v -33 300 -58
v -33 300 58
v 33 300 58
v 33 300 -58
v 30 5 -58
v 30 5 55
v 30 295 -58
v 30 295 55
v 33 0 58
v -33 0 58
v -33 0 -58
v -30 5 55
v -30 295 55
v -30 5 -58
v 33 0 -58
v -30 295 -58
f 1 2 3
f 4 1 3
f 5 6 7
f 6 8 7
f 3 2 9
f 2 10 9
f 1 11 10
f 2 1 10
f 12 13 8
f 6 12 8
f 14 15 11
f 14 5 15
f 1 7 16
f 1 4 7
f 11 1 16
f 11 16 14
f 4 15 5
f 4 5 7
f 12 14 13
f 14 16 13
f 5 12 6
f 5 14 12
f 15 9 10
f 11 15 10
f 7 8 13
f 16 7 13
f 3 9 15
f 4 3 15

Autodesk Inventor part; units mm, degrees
ref_plane "YZ Plane" through (0, 0, 0) normal (1, 0, 0) x (0, 1, 0)
ref_plane "XZ Plane" through (0, 0, 0) normal (0, 1, 0) x (-1, 0, 0)
ref_plane "XY Plane" through (0, 0, 0) normal (0, 0, 1) x (1, 0, 0)
sketch "Boceto1" plane through (0, 0, 0) normal (0, 1, 0) x (-1, 0, 0)
  line L0 (30, 55) -> (-30, 55)
  line L1 (-30, 55) -> (-30, -55)
  line L2 (-30, -55) -> (30, -55)
  line L3 (30, -55) -> (30, 55)
  line L4 (33, 58) -> (-33, 58)
  line L5 (-33, 58) -> (-33, -58)
  line L6 (-33, -58) -> (33, -58)
  line L7 (33, -58) -> (33, 58)
  point P0 (0, 0)
  point P1 (0, -55)
  point P2 (30, 0)
  dimension "d0" = 110
  dimension "d1" = 60
  dimension "d2" = 3
  dimension "d3" = 3
  dimension "d4" = 3
  dimension "d5" = 3
extrude "Extrusión1" add sketch "Boceto1" along normal blind 300
sketch "Boceto2" plane through (0, 300, 0) normal (0, 1, 0) x (1, 0, 0)
  line L0 (33, -58) -> (33, 58) construction
  line L1 (33, 58) -> (-33, 58) construction
  line L2 (-33, 58) -> (-33, -58) construction
  line L3 (-33, -58) -> (33, -58) construction
  line L4 (-30, -55) -> (-30, 55) construction
  line L5 (-30, 55) -> (30, 55) construction
  line L6 (30, 55) -> (30, -55) construction
  line L7 (30, -55) -> (-30, -55) construction
  line L8 (-30, -55) -> (-30, 55) projected
  line L9 (-30, 55) -> (30, 55)
  line L10 (30, 55) -> (30, 58)
  line L11 (30, 58) -> (-30, 58)
  line L12 (-30, 58) -> (-30, 55)
  point P0 (0, 0)
extrude "Extrusión2" cut sketch "Boceto2" against normal blind 295
extrude "Extrusión3" add sketch "Boceto1" along normal blind 5 contours L3 L2 L1 L0
sketch "Boceto4" plane through (30, 300, 55) normal (0, 0, -1) x (-1, 0, 0)
  line L0 (0, -295) -> (60, -295) construction
  line L1 (60, -295) -> (60, 0) construction
  line L2 (0, 0) -> (60, 0) construction
  line L3 (0, -295) -> (0, 0) construction
  line L4 (0, -295) -> (0, 0) projected
  line L5 (60, 0) -> (0, 0)
  line L6 (0, 0) -> (0, -5)
  line L7 (0, -5) -> (60, -5)
  line L8 (60, -5) -> (60, 0)
  point P0 (30, -300)
  dimension "d12" = 5
extrude "Extrusión4" add sketch "Boceto4" along normal blind 113
properties part number "caja"
